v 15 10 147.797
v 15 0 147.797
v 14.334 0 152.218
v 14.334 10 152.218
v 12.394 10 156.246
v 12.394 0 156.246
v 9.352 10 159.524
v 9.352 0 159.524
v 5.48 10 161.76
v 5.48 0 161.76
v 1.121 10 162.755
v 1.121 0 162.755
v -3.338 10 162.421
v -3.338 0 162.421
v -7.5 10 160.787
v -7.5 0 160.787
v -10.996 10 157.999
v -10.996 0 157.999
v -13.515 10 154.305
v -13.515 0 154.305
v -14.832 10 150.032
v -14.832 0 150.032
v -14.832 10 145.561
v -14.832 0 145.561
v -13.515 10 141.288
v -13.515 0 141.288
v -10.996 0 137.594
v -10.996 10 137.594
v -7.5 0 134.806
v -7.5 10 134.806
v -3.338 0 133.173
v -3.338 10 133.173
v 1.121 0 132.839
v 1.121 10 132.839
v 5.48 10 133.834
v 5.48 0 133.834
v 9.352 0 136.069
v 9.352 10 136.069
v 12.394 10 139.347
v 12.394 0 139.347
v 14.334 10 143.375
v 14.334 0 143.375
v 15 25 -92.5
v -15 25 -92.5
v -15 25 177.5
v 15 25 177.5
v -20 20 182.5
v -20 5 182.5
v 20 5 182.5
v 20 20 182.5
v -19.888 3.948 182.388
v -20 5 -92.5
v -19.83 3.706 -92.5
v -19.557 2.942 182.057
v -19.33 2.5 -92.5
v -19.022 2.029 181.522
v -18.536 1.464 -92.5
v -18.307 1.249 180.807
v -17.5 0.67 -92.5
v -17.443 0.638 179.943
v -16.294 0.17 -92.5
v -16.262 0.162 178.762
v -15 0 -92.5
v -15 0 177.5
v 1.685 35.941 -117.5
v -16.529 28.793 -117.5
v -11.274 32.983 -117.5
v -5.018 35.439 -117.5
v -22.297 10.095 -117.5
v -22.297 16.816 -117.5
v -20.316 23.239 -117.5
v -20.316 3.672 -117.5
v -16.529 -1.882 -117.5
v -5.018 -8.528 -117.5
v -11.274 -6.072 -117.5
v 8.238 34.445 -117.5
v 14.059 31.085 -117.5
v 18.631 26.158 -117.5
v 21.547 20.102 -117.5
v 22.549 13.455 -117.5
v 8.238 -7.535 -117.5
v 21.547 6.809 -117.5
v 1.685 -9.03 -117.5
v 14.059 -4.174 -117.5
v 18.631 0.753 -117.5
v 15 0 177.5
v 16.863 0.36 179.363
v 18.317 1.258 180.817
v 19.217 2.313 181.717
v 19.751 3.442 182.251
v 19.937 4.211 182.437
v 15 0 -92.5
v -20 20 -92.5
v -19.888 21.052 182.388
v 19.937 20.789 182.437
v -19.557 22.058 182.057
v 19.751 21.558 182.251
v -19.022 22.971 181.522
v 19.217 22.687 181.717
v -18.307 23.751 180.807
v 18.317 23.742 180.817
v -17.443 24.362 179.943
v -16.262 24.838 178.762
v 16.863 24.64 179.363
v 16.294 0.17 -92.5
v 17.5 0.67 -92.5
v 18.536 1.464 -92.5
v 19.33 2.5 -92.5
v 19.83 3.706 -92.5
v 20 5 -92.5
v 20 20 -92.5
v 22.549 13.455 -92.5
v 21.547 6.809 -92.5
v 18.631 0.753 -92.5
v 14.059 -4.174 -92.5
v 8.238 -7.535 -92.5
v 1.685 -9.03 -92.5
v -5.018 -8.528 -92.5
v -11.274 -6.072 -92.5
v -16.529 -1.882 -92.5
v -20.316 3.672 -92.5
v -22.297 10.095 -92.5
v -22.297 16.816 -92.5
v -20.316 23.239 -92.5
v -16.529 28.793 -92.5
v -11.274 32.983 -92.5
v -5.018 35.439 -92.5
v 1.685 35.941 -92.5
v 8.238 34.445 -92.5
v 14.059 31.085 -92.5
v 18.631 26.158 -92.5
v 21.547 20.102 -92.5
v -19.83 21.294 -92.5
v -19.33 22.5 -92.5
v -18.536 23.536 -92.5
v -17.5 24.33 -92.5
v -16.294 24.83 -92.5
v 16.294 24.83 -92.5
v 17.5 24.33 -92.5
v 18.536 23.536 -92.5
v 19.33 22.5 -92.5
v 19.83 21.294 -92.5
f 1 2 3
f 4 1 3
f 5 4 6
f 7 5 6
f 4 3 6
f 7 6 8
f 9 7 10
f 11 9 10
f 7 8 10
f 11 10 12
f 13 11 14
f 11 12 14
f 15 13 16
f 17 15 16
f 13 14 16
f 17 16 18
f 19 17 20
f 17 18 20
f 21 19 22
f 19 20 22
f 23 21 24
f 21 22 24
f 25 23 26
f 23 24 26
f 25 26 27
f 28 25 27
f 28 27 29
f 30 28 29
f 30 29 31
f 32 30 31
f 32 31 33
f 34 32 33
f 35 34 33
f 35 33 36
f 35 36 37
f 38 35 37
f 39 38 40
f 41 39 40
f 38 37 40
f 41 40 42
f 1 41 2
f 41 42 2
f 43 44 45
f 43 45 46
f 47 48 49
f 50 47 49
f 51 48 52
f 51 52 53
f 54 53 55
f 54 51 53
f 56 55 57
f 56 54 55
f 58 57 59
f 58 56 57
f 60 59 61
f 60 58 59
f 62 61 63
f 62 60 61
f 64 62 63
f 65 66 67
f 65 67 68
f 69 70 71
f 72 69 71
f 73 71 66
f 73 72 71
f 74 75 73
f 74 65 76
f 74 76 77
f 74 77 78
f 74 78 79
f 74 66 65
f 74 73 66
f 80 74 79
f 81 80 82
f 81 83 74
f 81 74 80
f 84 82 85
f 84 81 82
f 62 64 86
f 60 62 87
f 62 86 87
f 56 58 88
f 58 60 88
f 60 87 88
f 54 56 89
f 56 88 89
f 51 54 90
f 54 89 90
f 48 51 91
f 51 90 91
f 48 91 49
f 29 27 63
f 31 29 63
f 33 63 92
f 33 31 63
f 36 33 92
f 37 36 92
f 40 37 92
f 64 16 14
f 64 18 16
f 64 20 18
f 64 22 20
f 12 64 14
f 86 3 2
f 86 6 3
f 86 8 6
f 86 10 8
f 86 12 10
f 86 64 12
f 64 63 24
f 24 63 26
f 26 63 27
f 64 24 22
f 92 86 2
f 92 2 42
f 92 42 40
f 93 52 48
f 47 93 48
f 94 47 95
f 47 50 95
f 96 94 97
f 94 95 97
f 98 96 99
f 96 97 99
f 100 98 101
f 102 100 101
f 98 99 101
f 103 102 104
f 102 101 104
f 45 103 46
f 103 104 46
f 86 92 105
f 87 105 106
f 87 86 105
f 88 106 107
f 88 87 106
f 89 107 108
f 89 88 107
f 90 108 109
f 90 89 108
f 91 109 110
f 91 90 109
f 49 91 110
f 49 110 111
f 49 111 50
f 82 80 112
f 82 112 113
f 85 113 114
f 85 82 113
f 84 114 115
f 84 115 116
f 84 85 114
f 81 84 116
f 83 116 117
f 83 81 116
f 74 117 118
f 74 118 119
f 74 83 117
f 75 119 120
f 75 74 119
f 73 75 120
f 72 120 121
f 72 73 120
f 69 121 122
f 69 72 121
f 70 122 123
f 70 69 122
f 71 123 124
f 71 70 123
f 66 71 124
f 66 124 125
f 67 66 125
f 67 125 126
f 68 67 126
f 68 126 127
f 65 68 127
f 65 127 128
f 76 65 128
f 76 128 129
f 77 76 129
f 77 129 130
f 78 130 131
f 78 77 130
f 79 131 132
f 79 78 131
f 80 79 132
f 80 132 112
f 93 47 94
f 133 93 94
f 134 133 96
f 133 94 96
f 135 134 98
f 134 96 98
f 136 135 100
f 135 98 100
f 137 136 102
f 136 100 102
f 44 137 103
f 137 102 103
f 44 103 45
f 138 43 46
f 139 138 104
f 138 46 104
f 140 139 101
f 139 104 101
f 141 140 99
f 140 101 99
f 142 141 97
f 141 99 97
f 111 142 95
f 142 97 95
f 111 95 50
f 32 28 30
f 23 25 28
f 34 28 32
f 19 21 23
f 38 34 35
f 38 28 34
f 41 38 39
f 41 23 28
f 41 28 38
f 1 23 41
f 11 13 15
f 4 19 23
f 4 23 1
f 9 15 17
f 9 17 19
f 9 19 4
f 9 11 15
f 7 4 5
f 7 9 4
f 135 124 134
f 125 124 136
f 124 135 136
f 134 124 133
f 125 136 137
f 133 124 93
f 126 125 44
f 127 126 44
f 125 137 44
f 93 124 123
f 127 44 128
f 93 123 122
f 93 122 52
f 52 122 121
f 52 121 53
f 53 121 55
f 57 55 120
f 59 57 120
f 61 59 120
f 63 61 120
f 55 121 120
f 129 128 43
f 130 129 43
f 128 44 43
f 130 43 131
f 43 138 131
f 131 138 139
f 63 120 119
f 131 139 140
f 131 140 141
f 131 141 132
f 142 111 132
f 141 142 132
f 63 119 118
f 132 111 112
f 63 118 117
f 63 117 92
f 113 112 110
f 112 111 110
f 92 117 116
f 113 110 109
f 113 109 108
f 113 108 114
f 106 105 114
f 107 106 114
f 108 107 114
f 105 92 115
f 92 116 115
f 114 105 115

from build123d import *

# Parameters (mm, degrees)
F0_W     = 40
F0_H     = 300
F1_DEPTH = 25
F2_R     = 15
F3_DEPTH = 10
F4_R     = 5
F5_R     = 4.99999
F6_R     = 22.5487204306
F7_DEPTH = 25


# Not quite as in the source:
# - a fillet or chamfer is up to 0.001 mm smaller than in the source, because OpenCascade refuses the exact size


with BuildPart() as f1:
    # F0 (on Front) → F1 (new body)
    with BuildSketch(Plane.XZ):
        with Locations((0, 32.5)):
            Rectangle(F0_W, F0_H)
    extrude(amount=-F1_DEPTH)

    # F2 (on Front) → F3 (cut)
    with BuildSketch(Plane.XZ):
        with Locations((0, 147.7966460525)):
            Circle(F2_R)
    extrude(amount=-F3_DEPTH, mode=Mode.SUBTRACT)

    # F4
    f4_edges = [f1.edges().sort_by_distance(p)[0] for p in [
        (20, 25, 32.5),
        (-20, 25, 32.5),
        (0, 25, 182.5),
    ]]
    fillet(f4_edges, radius=F4_R)

    # F5 (radius 5 in the source; OpenCascade refuses exactly that, so slightly less here)
    f5_edges = [f1.edges().sort_by_distance(p)[0] for p in [
        (20, 0, 32.5),
        (-20, 0, 32.5),
        (0, 0, 182.5),
    ]]
    fillet(f5_edges, radius=F5_R)

    # F6 (on face) → F7 (join)
    with BuildSketch(Plane(origin=(0, 0, -117.5), x_dir=(1, 0, 0), z_dir=(0, 0, -1))):
        with Locations((0, -13.4554868564)):
            Circle(F6_R)
    extrude(amount=-F7_DEPTH)


solid = f1.part
